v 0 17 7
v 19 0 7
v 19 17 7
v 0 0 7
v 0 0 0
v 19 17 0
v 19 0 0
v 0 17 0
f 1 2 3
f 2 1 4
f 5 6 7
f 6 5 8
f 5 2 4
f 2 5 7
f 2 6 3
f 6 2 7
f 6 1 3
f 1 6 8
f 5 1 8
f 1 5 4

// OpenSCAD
// Generated by SolidPython 1.0.1 on 2020-07-29 00:46:56


cube(size = [19, 17, 7]);
/***********************************************
*********      SolidPython code:      **********
************************************************
 
# import packages: SolidPython
from solid import *
from solid.utils import *
from itertools import chain, combinations, permutations


class Resize:

    def __init__(self, scad_file):
        self.scad_file = scad_file
        #self.scad_file = import_scad(scad_file)
        # cone/cylinder param:
        self.r1 = 0
        self.r2 = 0
        self.h = 0
        # rectangular prism param:
        self.w = 0
        self.l = 0
        # ellipse param:
        self.r = 0

    # import OpenScad code (file name corresponds to shape)


    # classify shape + parameters
    def assign(self, param1, param2, param3):
        if self.scad_file == 'cone.scad':
            self.r1 = param1
            self.r2 = param2
            self.h = param3
        elif self.scad_file == 'cylinder.scad':
            self.r1 = param1
            self.r2 = param2
            self.h = param3
        elif self.scad_file == 'rectangularPrism.scad':
            self.h = param1
            self.l = param2
            self.w = param3
        else:
            self.r = param1
            self.h = param2

    # resize parameters
    def iterate(self):
        x = range(3, 20, 2)
        i = 1
        if self.scad_file == 'cone.scad':
            tempList = list(permutations(x, 2))
            for temp in tempList:
                param1 = temp[0]
                param2 = temp[1]
                filepath = 'produced_scad_files/' + 'cone' + str(param1) + '_' + str(param2) + '_' + '.scad'
                scad_render_to_file(cylinder(h=param1, r1=param2, r2=0), filepath)

        elif self.scad_file == 'cylinder.scad':
            tempList = list(permutations(x, 3))
            for temp in tempList:
                param1 = temp[0]
                param2 = temp[1]
                filepath = 'produced_scad_files/' + 'cylinder' + str(param1) + '_' + str(param2) + '_' + '.scad'
                scad_render_to_file(cylinder(h=param1, r1=param2, r2=param2), filepath)

        elif self.scad_file == 'rectangularPrism.scad':
            tempList = list(permutations(x, 3))
            for temp in tempList:
                param1 = temp[0]
                param2 = temp[1]
                param3 = temp[2]
                filepath = 'produced_scad_files/' + 'rectangularPrism' + str(param1) + '_' + str(param2) + '_' + str(
                    param3) + '.scad'
                scad_render_to_file(cube(size=(param1, param2, param3)), filepath)

        elif self.scad_file == 'ellipse.scad':
            tempList = list(permutations(x, 4))
            for temp in tempList:
                param1 = temp[0]
                param2 = temp[1]
                param3 = temp[2]
                param4 = temp[3]
                filepath = 'produced_scad_files/' + 'ellipse' + str(param1) + '_' + str(param2) + '_' + str(param3) + '_' + str(param4) + '.scad'
                scad_render_to_file(scale([param1, param2, param3])(sphere(r=param4)), filepath)

    def render_to_scadfile(self):
        scad_render_to_file(scad, 'example.scad') 
 
************************************************/
